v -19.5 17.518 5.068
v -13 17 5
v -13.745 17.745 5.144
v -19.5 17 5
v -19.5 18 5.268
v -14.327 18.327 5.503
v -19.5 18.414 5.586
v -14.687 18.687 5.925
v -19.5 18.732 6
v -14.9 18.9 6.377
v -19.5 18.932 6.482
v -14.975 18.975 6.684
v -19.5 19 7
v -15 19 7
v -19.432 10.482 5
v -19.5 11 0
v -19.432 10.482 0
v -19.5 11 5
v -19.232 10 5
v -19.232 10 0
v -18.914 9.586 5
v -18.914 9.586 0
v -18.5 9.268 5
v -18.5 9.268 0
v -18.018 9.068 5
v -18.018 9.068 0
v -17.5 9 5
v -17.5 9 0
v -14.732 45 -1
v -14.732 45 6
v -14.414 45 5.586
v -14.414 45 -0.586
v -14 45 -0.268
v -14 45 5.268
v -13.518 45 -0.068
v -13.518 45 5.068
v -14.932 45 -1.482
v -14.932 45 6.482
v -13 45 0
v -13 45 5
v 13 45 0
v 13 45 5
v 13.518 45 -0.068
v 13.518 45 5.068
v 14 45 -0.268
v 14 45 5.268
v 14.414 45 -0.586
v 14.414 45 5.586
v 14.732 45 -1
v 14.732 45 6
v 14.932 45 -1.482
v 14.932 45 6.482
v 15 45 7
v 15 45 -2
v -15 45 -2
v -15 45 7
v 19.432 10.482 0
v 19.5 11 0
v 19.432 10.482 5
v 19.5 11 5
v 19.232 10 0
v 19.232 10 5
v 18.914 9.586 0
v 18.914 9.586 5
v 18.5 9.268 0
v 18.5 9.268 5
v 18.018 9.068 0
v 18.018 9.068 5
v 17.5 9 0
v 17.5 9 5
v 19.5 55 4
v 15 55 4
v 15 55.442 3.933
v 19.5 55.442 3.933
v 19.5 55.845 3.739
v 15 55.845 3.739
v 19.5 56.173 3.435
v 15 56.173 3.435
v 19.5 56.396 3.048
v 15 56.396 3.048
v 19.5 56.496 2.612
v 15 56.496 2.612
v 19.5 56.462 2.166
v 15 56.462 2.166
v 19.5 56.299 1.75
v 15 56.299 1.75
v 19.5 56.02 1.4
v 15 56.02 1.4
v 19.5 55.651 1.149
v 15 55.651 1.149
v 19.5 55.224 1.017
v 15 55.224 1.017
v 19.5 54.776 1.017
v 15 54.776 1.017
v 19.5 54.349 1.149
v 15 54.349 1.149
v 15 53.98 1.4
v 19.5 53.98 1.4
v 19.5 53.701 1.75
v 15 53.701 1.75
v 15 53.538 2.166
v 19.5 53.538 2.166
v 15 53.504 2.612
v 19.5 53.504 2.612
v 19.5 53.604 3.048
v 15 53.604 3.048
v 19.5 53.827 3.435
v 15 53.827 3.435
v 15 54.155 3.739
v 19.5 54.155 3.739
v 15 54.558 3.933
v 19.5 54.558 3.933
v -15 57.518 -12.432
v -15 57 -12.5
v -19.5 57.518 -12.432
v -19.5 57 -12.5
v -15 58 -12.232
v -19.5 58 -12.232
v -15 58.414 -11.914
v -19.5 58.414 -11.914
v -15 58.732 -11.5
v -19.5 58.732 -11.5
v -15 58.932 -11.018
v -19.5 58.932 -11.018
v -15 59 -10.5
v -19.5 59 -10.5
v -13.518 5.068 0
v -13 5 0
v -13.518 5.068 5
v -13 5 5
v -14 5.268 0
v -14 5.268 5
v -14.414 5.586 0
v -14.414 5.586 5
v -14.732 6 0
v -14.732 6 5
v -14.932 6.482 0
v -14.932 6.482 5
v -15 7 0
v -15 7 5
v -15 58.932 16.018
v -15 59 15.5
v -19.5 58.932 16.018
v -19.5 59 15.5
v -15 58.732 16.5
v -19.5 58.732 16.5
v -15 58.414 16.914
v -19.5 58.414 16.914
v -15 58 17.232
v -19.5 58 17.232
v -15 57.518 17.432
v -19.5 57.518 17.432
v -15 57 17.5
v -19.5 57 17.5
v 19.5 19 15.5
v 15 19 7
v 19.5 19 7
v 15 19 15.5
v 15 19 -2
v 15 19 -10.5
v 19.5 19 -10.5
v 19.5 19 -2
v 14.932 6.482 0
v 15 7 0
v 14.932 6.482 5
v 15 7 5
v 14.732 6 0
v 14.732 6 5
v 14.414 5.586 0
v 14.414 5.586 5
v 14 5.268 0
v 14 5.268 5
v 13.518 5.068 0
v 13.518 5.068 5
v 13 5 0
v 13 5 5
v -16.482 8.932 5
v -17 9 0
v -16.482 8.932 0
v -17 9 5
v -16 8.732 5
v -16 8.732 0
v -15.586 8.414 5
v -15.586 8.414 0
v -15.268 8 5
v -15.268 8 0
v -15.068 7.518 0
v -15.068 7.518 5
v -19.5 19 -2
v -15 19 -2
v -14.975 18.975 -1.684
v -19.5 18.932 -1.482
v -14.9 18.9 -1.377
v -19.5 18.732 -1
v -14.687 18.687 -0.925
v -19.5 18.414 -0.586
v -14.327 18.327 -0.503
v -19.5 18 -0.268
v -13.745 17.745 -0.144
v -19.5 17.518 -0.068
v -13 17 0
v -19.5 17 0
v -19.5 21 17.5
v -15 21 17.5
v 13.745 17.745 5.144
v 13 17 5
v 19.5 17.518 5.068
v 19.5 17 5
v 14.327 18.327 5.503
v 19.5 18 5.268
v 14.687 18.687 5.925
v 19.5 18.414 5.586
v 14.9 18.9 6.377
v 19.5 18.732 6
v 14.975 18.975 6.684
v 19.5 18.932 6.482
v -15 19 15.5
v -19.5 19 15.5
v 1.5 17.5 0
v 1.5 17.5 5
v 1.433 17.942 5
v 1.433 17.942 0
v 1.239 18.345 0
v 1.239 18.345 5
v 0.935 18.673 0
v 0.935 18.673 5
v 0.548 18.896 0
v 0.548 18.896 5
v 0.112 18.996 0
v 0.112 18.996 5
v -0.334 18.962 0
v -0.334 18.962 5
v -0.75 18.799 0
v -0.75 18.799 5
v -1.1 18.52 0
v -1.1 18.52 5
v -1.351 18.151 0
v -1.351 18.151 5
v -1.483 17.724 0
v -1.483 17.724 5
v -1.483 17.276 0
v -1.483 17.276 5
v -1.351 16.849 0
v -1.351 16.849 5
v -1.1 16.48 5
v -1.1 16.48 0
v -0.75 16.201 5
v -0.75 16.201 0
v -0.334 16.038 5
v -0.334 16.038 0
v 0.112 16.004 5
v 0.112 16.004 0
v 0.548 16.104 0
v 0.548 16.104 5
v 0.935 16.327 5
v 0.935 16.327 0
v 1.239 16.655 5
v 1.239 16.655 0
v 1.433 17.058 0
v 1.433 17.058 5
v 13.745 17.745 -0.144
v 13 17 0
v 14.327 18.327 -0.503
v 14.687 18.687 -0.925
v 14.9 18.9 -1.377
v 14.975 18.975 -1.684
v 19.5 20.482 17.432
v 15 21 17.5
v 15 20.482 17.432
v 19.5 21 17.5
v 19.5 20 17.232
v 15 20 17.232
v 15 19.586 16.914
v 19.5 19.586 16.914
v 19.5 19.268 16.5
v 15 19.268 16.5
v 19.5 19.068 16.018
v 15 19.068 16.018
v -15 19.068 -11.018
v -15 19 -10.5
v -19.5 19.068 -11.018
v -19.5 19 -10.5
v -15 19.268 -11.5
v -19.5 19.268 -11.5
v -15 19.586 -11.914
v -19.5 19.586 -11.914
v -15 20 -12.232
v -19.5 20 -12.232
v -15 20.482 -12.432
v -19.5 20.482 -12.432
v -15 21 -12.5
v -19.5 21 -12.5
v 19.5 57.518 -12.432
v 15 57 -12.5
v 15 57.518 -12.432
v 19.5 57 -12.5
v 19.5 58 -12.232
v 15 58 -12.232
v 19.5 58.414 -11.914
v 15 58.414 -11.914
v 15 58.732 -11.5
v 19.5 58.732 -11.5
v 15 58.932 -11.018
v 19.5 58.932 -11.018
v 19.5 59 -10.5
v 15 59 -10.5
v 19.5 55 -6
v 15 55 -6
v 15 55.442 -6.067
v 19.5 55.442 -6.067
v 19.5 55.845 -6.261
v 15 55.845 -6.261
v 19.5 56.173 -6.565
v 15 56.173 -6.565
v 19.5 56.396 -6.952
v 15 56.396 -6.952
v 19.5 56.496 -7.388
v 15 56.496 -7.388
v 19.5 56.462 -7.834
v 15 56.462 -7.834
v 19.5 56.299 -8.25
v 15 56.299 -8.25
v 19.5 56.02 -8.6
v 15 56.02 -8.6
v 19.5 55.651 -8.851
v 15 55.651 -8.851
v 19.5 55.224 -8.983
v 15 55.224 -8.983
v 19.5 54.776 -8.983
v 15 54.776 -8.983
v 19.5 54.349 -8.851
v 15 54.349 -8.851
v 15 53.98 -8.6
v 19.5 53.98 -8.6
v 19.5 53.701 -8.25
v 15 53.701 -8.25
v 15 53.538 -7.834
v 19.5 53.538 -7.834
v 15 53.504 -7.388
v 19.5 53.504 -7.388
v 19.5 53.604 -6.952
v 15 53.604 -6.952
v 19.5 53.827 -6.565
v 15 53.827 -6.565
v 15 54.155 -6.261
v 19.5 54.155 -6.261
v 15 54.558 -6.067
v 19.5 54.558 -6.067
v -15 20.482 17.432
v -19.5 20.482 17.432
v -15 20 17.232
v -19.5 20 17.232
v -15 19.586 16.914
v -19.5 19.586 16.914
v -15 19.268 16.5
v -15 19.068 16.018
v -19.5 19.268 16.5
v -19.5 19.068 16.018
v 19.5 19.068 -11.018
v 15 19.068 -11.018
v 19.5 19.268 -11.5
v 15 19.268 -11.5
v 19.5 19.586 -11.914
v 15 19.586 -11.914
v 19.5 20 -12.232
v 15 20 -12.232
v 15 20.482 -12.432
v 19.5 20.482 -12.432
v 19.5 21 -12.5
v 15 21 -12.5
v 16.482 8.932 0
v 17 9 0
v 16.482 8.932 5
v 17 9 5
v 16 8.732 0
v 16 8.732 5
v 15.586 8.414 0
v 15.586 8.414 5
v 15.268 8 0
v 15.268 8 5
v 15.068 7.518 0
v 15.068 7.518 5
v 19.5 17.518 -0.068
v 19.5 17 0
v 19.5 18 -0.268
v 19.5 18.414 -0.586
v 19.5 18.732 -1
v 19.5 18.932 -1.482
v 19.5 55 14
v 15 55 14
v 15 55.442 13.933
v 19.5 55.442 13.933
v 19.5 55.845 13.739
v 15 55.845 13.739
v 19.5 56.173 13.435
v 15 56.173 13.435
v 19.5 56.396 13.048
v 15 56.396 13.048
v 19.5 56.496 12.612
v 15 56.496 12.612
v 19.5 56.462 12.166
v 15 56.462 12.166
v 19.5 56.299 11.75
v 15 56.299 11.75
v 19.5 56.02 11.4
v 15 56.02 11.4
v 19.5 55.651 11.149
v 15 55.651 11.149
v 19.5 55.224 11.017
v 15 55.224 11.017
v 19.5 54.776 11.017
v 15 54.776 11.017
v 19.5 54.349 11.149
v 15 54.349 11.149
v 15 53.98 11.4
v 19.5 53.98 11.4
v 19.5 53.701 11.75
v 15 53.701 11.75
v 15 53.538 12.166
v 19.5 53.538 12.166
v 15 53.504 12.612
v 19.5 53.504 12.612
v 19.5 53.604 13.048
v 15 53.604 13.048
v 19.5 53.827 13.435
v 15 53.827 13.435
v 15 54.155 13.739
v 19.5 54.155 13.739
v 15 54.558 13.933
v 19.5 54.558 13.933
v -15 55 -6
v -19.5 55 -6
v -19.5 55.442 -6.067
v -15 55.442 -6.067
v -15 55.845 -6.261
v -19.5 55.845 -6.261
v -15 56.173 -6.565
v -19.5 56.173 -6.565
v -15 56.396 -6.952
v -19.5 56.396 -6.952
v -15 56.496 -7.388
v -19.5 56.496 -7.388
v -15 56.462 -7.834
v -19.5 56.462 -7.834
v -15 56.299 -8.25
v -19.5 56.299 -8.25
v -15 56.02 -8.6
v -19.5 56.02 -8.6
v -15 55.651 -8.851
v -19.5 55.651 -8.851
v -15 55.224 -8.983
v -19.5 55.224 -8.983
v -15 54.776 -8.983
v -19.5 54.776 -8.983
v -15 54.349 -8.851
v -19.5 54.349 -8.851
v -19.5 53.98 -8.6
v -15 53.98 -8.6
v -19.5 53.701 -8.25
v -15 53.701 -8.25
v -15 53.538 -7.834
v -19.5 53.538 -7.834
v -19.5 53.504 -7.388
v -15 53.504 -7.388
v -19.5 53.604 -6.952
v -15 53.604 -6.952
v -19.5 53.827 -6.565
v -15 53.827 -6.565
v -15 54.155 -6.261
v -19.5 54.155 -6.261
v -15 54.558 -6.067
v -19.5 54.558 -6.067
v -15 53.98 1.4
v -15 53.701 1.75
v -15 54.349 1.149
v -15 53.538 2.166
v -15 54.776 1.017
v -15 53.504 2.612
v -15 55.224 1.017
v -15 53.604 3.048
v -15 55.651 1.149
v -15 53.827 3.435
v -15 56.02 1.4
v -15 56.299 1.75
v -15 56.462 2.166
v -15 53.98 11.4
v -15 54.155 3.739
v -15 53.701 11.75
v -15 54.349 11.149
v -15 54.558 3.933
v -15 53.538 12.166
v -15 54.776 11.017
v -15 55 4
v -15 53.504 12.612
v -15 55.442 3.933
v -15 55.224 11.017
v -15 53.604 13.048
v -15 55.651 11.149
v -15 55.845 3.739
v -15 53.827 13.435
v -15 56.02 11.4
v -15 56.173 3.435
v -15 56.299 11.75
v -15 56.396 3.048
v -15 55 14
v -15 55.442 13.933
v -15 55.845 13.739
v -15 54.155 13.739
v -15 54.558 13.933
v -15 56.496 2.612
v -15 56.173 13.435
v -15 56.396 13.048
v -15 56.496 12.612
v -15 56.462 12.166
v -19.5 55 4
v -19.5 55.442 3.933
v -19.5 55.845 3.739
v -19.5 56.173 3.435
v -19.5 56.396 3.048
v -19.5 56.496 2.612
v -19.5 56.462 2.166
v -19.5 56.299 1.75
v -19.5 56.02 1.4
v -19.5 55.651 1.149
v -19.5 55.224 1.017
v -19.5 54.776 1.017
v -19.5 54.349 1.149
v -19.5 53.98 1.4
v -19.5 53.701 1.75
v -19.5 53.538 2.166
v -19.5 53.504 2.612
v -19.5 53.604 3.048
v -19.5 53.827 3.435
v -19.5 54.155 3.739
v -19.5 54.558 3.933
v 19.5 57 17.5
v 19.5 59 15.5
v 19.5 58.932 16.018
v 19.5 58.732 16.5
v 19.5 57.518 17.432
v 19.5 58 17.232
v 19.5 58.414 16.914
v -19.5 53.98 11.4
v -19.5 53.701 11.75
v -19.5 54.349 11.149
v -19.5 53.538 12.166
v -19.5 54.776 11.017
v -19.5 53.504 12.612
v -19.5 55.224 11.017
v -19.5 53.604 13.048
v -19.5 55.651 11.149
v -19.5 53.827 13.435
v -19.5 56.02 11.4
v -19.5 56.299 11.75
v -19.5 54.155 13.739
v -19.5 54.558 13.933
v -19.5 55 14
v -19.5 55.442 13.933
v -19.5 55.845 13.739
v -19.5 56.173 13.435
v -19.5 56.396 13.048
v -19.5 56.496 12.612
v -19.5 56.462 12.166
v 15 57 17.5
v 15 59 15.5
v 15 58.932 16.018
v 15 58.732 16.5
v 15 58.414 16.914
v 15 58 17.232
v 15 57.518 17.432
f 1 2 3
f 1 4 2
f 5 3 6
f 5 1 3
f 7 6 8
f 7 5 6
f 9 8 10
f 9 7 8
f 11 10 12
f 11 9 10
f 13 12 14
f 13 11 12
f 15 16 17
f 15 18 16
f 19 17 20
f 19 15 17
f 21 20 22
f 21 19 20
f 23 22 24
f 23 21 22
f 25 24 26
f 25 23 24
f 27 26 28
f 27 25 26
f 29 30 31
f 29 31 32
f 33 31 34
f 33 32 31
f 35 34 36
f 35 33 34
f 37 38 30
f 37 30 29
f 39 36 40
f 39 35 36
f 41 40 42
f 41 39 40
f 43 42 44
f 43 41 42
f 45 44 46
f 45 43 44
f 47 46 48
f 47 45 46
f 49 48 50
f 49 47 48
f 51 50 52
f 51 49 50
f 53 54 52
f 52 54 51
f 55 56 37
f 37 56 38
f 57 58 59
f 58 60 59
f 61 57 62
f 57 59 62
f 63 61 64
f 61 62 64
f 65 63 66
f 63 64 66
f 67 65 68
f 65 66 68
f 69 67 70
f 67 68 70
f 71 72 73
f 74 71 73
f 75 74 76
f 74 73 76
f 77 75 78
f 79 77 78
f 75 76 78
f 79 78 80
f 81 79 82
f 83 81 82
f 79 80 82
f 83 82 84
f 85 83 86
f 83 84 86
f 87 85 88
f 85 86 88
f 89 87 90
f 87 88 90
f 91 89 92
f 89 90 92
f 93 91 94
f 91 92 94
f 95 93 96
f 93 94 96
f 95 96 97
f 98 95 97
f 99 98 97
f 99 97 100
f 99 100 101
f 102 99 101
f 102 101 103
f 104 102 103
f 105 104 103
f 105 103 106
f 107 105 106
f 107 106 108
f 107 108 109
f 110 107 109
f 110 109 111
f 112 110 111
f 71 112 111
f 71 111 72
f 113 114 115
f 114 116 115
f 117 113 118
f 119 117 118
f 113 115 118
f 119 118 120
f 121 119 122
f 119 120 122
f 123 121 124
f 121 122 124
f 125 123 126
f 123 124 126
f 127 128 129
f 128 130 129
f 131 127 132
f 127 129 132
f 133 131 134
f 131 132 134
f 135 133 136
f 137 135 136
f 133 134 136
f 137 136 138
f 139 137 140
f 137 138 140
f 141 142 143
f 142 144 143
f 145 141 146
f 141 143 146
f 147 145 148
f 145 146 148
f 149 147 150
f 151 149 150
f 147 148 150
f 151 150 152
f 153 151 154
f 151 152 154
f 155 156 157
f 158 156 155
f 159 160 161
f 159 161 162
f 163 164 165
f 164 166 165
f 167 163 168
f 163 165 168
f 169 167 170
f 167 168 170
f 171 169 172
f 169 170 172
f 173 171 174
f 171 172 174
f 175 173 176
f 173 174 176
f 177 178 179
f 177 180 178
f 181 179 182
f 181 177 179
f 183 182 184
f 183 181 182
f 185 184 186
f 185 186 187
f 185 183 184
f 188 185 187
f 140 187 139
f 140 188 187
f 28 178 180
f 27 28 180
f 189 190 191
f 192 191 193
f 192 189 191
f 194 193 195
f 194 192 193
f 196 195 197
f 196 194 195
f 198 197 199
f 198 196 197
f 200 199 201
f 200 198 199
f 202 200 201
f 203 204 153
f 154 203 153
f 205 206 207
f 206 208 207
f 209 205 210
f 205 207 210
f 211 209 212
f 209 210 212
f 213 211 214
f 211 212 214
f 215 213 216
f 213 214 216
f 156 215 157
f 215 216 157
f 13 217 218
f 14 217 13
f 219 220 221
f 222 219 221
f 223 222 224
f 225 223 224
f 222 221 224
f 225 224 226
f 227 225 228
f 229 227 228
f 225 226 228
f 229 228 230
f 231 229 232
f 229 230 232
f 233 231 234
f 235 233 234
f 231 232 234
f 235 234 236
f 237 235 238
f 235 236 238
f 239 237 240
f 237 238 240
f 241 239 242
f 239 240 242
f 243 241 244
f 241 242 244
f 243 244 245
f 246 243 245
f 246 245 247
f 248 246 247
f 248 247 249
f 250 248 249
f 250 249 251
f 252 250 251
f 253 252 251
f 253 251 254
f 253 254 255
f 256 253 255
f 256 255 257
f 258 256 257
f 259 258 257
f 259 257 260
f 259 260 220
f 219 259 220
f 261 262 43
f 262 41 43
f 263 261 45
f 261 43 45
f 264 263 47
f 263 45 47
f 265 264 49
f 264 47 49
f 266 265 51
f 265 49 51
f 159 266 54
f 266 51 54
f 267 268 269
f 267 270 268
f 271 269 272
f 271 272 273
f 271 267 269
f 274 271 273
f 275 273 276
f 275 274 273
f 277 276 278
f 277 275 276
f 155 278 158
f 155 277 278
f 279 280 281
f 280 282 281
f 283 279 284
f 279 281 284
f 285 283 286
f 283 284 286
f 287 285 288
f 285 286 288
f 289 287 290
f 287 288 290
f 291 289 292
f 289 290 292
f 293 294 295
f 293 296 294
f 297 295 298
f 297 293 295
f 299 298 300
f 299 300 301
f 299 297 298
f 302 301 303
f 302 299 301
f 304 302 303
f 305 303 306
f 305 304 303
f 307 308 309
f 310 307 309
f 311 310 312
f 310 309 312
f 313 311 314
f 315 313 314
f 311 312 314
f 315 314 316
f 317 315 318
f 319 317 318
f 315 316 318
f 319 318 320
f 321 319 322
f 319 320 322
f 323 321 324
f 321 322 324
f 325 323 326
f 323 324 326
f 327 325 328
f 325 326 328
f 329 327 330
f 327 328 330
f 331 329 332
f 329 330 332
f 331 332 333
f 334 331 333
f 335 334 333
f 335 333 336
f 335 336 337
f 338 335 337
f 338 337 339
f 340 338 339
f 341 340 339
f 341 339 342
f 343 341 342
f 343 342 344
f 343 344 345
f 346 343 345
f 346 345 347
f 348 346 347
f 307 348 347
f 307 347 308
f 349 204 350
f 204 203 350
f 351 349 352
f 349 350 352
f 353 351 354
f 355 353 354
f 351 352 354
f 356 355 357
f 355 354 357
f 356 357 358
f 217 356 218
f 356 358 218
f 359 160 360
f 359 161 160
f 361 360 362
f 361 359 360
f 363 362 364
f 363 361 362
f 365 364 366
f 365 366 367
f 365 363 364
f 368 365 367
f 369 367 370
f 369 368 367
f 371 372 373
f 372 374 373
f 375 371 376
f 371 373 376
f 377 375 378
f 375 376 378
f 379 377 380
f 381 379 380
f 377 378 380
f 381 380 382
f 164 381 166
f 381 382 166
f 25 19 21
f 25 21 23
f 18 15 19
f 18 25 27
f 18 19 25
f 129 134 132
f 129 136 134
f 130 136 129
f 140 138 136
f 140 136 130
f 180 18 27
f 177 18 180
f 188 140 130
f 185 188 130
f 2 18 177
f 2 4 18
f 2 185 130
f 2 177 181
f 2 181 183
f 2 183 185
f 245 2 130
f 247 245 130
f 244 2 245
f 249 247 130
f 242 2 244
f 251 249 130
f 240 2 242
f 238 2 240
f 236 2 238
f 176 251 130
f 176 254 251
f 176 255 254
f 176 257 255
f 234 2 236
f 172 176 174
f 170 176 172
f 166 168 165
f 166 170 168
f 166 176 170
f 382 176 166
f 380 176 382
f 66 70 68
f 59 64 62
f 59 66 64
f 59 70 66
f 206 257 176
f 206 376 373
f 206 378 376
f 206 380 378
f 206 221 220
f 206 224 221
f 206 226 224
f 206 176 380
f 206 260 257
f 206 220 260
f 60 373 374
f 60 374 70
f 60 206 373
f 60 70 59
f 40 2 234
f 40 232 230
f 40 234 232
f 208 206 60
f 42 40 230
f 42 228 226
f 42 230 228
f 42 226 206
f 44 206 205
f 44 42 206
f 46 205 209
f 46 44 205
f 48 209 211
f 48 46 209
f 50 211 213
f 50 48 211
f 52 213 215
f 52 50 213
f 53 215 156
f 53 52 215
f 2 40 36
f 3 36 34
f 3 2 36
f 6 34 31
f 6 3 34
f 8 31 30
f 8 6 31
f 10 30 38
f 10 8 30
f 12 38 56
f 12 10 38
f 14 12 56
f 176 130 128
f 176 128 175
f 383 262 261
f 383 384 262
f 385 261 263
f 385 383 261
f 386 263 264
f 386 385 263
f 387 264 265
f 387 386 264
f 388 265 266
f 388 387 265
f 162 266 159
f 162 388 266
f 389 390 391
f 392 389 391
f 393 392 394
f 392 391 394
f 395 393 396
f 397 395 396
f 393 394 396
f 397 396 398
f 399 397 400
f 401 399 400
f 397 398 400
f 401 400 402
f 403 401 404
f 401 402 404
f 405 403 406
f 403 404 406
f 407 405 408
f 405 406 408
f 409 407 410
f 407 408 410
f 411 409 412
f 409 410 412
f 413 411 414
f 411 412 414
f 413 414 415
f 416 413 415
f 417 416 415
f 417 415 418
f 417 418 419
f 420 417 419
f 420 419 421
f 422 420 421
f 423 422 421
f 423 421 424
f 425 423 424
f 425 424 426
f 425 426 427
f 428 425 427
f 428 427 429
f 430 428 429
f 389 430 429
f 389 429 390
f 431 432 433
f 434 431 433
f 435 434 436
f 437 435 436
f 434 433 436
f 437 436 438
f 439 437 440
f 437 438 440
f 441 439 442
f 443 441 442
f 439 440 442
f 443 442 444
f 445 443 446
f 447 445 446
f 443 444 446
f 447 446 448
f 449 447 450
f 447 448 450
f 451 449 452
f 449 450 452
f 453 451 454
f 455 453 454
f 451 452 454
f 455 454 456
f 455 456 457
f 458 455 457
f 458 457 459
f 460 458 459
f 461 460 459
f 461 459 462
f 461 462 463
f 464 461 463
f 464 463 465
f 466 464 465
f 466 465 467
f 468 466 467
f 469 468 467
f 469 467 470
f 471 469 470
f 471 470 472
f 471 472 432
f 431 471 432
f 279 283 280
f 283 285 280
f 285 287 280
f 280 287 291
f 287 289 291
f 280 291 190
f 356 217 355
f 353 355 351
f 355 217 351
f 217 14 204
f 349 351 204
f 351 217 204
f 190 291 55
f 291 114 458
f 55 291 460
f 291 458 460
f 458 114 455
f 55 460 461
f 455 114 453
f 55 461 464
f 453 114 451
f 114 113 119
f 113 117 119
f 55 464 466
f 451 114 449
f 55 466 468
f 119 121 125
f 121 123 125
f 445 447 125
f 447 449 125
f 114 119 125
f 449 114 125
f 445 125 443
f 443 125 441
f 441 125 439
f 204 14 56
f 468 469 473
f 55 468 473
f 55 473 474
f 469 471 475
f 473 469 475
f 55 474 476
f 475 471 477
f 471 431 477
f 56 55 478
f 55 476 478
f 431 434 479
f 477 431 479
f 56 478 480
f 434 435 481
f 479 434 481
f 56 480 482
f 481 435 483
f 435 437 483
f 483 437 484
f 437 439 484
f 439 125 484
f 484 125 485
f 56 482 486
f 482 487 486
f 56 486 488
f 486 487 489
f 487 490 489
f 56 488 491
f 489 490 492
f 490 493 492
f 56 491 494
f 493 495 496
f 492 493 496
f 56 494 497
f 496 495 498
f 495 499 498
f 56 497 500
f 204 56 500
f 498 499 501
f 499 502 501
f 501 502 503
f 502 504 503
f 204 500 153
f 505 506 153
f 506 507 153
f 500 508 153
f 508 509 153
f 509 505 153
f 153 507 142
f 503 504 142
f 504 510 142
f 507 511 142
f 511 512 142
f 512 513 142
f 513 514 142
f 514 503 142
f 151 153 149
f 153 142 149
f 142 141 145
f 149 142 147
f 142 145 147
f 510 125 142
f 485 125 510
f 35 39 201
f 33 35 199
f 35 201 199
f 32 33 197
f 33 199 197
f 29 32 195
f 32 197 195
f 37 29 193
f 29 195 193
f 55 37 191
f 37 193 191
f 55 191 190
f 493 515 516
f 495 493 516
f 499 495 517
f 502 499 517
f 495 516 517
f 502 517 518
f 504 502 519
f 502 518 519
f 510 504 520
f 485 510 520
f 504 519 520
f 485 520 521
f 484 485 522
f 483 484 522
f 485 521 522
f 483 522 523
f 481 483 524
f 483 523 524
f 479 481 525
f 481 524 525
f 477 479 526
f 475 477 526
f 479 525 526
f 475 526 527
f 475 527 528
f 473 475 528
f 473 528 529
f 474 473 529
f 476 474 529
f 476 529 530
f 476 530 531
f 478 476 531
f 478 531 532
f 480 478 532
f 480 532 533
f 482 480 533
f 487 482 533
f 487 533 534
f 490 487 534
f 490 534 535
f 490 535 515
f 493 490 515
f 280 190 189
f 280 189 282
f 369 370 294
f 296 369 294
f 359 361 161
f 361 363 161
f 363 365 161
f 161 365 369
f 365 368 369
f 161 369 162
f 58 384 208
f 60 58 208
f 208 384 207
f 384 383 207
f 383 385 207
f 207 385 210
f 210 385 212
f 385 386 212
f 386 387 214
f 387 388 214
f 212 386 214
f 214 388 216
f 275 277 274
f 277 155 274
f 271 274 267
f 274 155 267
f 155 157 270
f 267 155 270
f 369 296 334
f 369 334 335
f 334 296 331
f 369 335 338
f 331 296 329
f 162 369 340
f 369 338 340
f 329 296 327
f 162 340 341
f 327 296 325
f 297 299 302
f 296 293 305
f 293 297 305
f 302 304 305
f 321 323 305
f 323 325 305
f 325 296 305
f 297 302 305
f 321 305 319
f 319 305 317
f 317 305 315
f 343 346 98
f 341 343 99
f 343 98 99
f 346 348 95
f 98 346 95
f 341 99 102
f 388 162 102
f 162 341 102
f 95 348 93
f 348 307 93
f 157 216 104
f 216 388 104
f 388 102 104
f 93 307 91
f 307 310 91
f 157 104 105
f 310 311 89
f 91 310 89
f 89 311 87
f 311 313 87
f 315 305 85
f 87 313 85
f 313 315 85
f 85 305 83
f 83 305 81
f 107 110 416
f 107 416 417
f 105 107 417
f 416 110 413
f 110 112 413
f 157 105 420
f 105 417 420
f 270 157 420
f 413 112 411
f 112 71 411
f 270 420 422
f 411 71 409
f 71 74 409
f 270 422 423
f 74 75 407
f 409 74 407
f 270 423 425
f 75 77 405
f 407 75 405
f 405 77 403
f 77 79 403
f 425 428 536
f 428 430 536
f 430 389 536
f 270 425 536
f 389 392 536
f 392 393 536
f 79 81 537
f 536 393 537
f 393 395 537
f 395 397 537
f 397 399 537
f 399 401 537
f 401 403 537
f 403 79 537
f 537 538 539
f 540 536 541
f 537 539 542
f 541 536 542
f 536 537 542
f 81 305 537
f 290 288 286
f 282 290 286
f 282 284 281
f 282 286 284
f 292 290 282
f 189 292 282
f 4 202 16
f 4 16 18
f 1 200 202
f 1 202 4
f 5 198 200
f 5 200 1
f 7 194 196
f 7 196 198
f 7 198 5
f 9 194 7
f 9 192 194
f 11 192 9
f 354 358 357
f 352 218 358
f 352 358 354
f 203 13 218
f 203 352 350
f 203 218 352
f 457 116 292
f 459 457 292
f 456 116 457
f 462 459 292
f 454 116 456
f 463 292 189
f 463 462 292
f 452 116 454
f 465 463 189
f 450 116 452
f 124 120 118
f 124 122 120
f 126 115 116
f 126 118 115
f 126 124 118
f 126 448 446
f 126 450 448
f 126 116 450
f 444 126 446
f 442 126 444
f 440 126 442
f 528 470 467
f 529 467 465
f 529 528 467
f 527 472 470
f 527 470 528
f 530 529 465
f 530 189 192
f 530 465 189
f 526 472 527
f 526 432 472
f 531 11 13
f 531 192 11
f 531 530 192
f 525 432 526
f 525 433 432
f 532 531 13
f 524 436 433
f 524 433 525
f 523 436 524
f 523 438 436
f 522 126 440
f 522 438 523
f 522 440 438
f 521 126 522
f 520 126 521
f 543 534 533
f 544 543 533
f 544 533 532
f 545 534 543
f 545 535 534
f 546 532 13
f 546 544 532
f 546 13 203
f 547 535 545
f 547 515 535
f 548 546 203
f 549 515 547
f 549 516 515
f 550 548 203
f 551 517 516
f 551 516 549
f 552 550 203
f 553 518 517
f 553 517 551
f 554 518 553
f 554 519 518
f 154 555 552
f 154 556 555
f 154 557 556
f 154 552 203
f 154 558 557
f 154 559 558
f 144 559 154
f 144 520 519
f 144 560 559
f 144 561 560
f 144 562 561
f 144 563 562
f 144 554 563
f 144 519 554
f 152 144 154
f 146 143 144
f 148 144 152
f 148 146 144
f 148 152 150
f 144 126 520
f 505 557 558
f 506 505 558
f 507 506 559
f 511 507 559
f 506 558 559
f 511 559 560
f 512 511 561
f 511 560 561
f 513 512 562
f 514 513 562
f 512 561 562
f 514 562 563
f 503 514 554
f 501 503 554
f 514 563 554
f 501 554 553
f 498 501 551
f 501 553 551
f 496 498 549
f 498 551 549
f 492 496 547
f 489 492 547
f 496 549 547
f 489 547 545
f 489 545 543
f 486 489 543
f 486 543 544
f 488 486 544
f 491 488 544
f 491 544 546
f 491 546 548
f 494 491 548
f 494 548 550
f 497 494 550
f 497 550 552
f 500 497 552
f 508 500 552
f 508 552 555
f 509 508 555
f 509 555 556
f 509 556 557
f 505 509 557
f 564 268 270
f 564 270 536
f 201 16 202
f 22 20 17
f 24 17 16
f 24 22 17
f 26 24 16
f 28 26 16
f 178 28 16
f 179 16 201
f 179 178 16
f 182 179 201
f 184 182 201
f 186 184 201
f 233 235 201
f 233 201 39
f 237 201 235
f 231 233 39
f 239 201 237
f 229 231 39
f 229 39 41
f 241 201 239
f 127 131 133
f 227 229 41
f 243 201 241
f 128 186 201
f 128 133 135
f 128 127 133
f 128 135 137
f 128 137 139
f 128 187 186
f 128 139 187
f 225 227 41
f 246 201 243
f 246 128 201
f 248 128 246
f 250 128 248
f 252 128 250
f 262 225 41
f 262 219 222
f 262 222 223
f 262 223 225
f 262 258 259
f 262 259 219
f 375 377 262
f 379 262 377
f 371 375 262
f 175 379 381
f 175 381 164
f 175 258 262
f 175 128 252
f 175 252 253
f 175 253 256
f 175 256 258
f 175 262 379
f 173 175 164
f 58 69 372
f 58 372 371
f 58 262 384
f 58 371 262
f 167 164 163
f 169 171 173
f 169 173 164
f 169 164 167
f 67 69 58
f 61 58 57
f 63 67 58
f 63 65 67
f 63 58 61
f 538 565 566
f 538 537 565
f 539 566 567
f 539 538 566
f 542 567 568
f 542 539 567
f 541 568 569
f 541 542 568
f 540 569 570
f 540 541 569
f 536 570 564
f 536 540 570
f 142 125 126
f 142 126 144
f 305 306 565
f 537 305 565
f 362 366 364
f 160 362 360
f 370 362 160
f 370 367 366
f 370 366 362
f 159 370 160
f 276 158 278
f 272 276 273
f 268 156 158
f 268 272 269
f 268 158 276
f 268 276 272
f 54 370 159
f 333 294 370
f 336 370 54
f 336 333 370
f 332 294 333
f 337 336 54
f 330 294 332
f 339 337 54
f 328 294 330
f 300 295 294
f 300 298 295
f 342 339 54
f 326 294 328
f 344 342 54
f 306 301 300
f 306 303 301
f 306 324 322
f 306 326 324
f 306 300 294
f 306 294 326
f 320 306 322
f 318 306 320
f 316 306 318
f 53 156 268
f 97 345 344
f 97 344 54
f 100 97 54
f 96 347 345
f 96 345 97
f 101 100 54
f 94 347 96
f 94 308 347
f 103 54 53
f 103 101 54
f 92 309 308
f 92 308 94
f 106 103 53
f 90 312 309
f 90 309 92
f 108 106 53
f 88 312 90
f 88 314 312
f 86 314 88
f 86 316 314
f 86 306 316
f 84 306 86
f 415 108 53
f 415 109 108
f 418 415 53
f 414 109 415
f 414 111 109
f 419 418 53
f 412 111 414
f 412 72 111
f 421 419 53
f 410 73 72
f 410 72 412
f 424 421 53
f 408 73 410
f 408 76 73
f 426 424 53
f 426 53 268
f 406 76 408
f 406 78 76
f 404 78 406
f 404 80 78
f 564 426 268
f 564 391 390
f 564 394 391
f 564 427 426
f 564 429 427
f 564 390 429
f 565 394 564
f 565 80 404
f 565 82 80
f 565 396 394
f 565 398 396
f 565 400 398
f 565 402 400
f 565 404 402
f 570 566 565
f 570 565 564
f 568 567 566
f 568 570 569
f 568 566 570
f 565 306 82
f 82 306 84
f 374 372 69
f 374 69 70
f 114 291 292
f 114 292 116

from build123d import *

# Parameters (mm, degrees)
SKETCH_1_W           = 30
SKETCH_1_H           = 50
EXTRUDE_1_DEPTH      = 5
SKETCH_5_W           = 30
SKETCH_5_H           = 50
EXTRUDE_2_DEPTH      = 4.5
SKETCH_6_R           = 1.5
CUT_EXTRUDE_1_DEPTH  = 73.857738093
SKETCH_7_R           = 1.5
CUT_EXTRUDE_2_DEPTH  = 73.857738093
SKETCH_12_W          = 12.5
SKETCH_12_H          = 10
CUT_EXTRUDE_8_DEPTH  = 71.551399703
SKETCH_13_W          = 12.5
SKETCH_13_H          = 10
CUT_EXTRUDE_9_DEPTH  = 71.551399703
SKETCH_16_W          = 30
SKETCH_16_H          = 5
EXTRUDE_3_DEPTH      = 20
SKETCH_17_R          = 1.5
CUT_EXTRUDE_10_DEPTH = 20
SKETCH_18_W          = 53.118549685
SKETCH_18_H          = 48.988218424
CUT_EXTRUDE_11_DEPTH = 20
FILLET_1_R           = 2
FILLET_2_R           = 2
FILLET_3_R           = 2
FILLET_4_R           = 2
SKETCH_19_R          = 1.5
CUT_EXTRUDE_12_DEPTH = 10
SKETCH_21_R          = 1.5
EXTRUDE_4_DEPTH      = 5


with BuildPart() as part:
    # 草图1 → 凸台-拉伸1 (new body)
    with BuildSketch(Plane.XY):
        Rectangle(SKETCH_1_W, SKETCH_1_H)
    extrude(amount=EXTRUDE_1_DEPTH)

    # 草图5 → 凸台-拉伸2 (add)
    with BuildSketch(Plane.ZY.offset(15)):
        with Locations((2.5, 34)):
            Rectangle(SKETCH_5_W, SKETCH_5_H)
    extrude_2 = extrude(amount=EXTRUDE_2_DEPTH)

    # 镜向1: 凸台-拉伸2 across plane
    add(extrude_2.mirror(Plane(origin=(0, 0, 0), x_dir=(0, 0, 1), z_dir=(1, 0, 0))))

    # 草图6 → 切除-拉伸1 (cut, through all)
    with BuildSketch(Plane.ZY.offset(19.5)):
        with Locations((2.5, 55)):
            Circle(SKETCH_6_R)
    extrude(amount=-CUT_EXTRUDE_1_DEPTH, mode=Mode.SUBTRACT)

    # 草图7 → 切除-拉伸2 (cut, through all)
    with BuildSketch(Plane.ZY.offset(19.5)):
        with Locations((-7.5, 55)):
            Circle(SKETCH_7_R)
        with Locations((12.5, 55)):
            Circle(SKETCH_7_R)
    extrude(amount=-CUT_EXTRUDE_2_DEPTH, mode=Mode.SUBTRACT)

    # 草图12 → 切除-拉伸8 (cut, through all)
    with BuildSketch(Plane(origin=(-15, 0, 0), x_dir=(0, 0, -1), z_dir=(1, 0, 0))):
        with Locations((6.25, 14)):
            Rectangle(SKETCH_12_W, SKETCH_12_H)
        with Locations((-11.25, 14)):
            Rectangle(SKETCH_12_W, SKETCH_12_H)
    extrude(amount=-CUT_EXTRUDE_8_DEPTH, mode=Mode.SUBTRACT)

    # 草图13 → 切除-拉伸9 (cut, through all)
    with BuildSketch(Plane.ZY.offset(-15)):
        with Locations((11.25, 14)):
            Rectangle(SKETCH_13_W, SKETCH_13_H)
        with Locations((-6.25, 14)):
            Rectangle(SKETCH_13_W, SKETCH_13_H)
    extrude(amount=-CUT_EXTRUDE_9_DEPTH, mode=Mode.SUBTRACT)

    # 草图16 → 凸台-拉伸3 (add)
    with BuildSketch(Plane(origin=(0, 25, 0), x_dir=(1, 0, 0), z_dir=(0, 1, 0))):
        with Locations((0, -2.5)):
            Rectangle(SKETCH_16_W, SKETCH_16_H)
    extrude(amount=EXTRUDE_3_DEPTH)

    # 草图17 → 切除-拉伸10 (cut)
    with BuildSketch(Plane.XY.offset(5)):
        with Locations((0, 12.5)):
            Circle(SKETCH_17_R)
    extrude(amount=-CUT_EXTRUDE_10_DEPTH, mode=Mode.SUBTRACT)

    # 草图18 → 切除-拉伸11 (cut)
    with BuildSketch(Plane.XY.offset(5)):
        with Locations((5.810767558, -19.494109212)):
            Rectangle(SKETCH_18_W, SKETCH_18_H)
    extrude(amount=-CUT_EXTRUDE_11_DEPTH, mode=Mode.SUBTRACT)

    # 圆角1
    fillet_1_edges = [part.edges().sort_by_distance(p)[0] for p in [
        (17.25, 19, 5),
        (17.25, 19, 0),
        (-17.25, 19, 0),
        (-17.25, 19, 5),
    ]]
    fillet(fillet_1_edges, radius=FILLET_1_R)

    # 圆角2
    fillet_2_edges = [part.edges().sort_by_distance(p)[0] for p in [
        (15, 31, 0),
        (-15, 31, 0),
        (15, 31, 5),
        (-15, 31, 5),
    ]]
    fillet(fillet_2_edges, radius=FILLET_2_R)

    # 圆角3
    fillet_3_edges = [part.edges().sort_by_distance(p)[0] for p in [
        (17.25, 19, 17.5),
        (17.25, 19, -12.5),
        (-17.25, 59, -12.5),
        (-17.25, 59, 17.5),
        (17.25, 59, -12.5),
        (17.25, 59, 17.5),
        (-17.25, 19, -12.5),
        (-17.25, 19, 17.5),
    ]]
    fillet(fillet_3_edges, radius=FILLET_3_R)

    # 圆角4
    fillet_4_edges = [part.edges().sort_by_distance(p)[0] for p in [
        (15, 9, 2.5),
        (-15, 9, 2.5),
        (19.5, 9, 2.5),
        (15, 5, 2.5),
        (-15, 5, 2.5),
        (-19.5, 9, 2.5),
    ]]
    fillet(fillet_4_edges, radius=FILLET_4_R - 0.0001)  # a hair under: the kernel refuses the full size

    # 草图19 → 切除-拉伸12 (cut)
    with BuildSketch(Plane.XY.offset(5)):
        with Locations((0, 17.5)):
            Circle(SKETCH_19_R)
    extrude(amount=-CUT_EXTRUDE_12_DEPTH, mode=Mode.SUBTRACT)

    # 草图21 → 凸台-拉伸4 (add)
    with BuildSketch(Plane.XY.offset(5)):
        with Locations((0, 12.5)):
            Circle(SKETCH_21_R)
    extrude(amount=-EXTRUDE_4_DEPTH)


solid = part.part
